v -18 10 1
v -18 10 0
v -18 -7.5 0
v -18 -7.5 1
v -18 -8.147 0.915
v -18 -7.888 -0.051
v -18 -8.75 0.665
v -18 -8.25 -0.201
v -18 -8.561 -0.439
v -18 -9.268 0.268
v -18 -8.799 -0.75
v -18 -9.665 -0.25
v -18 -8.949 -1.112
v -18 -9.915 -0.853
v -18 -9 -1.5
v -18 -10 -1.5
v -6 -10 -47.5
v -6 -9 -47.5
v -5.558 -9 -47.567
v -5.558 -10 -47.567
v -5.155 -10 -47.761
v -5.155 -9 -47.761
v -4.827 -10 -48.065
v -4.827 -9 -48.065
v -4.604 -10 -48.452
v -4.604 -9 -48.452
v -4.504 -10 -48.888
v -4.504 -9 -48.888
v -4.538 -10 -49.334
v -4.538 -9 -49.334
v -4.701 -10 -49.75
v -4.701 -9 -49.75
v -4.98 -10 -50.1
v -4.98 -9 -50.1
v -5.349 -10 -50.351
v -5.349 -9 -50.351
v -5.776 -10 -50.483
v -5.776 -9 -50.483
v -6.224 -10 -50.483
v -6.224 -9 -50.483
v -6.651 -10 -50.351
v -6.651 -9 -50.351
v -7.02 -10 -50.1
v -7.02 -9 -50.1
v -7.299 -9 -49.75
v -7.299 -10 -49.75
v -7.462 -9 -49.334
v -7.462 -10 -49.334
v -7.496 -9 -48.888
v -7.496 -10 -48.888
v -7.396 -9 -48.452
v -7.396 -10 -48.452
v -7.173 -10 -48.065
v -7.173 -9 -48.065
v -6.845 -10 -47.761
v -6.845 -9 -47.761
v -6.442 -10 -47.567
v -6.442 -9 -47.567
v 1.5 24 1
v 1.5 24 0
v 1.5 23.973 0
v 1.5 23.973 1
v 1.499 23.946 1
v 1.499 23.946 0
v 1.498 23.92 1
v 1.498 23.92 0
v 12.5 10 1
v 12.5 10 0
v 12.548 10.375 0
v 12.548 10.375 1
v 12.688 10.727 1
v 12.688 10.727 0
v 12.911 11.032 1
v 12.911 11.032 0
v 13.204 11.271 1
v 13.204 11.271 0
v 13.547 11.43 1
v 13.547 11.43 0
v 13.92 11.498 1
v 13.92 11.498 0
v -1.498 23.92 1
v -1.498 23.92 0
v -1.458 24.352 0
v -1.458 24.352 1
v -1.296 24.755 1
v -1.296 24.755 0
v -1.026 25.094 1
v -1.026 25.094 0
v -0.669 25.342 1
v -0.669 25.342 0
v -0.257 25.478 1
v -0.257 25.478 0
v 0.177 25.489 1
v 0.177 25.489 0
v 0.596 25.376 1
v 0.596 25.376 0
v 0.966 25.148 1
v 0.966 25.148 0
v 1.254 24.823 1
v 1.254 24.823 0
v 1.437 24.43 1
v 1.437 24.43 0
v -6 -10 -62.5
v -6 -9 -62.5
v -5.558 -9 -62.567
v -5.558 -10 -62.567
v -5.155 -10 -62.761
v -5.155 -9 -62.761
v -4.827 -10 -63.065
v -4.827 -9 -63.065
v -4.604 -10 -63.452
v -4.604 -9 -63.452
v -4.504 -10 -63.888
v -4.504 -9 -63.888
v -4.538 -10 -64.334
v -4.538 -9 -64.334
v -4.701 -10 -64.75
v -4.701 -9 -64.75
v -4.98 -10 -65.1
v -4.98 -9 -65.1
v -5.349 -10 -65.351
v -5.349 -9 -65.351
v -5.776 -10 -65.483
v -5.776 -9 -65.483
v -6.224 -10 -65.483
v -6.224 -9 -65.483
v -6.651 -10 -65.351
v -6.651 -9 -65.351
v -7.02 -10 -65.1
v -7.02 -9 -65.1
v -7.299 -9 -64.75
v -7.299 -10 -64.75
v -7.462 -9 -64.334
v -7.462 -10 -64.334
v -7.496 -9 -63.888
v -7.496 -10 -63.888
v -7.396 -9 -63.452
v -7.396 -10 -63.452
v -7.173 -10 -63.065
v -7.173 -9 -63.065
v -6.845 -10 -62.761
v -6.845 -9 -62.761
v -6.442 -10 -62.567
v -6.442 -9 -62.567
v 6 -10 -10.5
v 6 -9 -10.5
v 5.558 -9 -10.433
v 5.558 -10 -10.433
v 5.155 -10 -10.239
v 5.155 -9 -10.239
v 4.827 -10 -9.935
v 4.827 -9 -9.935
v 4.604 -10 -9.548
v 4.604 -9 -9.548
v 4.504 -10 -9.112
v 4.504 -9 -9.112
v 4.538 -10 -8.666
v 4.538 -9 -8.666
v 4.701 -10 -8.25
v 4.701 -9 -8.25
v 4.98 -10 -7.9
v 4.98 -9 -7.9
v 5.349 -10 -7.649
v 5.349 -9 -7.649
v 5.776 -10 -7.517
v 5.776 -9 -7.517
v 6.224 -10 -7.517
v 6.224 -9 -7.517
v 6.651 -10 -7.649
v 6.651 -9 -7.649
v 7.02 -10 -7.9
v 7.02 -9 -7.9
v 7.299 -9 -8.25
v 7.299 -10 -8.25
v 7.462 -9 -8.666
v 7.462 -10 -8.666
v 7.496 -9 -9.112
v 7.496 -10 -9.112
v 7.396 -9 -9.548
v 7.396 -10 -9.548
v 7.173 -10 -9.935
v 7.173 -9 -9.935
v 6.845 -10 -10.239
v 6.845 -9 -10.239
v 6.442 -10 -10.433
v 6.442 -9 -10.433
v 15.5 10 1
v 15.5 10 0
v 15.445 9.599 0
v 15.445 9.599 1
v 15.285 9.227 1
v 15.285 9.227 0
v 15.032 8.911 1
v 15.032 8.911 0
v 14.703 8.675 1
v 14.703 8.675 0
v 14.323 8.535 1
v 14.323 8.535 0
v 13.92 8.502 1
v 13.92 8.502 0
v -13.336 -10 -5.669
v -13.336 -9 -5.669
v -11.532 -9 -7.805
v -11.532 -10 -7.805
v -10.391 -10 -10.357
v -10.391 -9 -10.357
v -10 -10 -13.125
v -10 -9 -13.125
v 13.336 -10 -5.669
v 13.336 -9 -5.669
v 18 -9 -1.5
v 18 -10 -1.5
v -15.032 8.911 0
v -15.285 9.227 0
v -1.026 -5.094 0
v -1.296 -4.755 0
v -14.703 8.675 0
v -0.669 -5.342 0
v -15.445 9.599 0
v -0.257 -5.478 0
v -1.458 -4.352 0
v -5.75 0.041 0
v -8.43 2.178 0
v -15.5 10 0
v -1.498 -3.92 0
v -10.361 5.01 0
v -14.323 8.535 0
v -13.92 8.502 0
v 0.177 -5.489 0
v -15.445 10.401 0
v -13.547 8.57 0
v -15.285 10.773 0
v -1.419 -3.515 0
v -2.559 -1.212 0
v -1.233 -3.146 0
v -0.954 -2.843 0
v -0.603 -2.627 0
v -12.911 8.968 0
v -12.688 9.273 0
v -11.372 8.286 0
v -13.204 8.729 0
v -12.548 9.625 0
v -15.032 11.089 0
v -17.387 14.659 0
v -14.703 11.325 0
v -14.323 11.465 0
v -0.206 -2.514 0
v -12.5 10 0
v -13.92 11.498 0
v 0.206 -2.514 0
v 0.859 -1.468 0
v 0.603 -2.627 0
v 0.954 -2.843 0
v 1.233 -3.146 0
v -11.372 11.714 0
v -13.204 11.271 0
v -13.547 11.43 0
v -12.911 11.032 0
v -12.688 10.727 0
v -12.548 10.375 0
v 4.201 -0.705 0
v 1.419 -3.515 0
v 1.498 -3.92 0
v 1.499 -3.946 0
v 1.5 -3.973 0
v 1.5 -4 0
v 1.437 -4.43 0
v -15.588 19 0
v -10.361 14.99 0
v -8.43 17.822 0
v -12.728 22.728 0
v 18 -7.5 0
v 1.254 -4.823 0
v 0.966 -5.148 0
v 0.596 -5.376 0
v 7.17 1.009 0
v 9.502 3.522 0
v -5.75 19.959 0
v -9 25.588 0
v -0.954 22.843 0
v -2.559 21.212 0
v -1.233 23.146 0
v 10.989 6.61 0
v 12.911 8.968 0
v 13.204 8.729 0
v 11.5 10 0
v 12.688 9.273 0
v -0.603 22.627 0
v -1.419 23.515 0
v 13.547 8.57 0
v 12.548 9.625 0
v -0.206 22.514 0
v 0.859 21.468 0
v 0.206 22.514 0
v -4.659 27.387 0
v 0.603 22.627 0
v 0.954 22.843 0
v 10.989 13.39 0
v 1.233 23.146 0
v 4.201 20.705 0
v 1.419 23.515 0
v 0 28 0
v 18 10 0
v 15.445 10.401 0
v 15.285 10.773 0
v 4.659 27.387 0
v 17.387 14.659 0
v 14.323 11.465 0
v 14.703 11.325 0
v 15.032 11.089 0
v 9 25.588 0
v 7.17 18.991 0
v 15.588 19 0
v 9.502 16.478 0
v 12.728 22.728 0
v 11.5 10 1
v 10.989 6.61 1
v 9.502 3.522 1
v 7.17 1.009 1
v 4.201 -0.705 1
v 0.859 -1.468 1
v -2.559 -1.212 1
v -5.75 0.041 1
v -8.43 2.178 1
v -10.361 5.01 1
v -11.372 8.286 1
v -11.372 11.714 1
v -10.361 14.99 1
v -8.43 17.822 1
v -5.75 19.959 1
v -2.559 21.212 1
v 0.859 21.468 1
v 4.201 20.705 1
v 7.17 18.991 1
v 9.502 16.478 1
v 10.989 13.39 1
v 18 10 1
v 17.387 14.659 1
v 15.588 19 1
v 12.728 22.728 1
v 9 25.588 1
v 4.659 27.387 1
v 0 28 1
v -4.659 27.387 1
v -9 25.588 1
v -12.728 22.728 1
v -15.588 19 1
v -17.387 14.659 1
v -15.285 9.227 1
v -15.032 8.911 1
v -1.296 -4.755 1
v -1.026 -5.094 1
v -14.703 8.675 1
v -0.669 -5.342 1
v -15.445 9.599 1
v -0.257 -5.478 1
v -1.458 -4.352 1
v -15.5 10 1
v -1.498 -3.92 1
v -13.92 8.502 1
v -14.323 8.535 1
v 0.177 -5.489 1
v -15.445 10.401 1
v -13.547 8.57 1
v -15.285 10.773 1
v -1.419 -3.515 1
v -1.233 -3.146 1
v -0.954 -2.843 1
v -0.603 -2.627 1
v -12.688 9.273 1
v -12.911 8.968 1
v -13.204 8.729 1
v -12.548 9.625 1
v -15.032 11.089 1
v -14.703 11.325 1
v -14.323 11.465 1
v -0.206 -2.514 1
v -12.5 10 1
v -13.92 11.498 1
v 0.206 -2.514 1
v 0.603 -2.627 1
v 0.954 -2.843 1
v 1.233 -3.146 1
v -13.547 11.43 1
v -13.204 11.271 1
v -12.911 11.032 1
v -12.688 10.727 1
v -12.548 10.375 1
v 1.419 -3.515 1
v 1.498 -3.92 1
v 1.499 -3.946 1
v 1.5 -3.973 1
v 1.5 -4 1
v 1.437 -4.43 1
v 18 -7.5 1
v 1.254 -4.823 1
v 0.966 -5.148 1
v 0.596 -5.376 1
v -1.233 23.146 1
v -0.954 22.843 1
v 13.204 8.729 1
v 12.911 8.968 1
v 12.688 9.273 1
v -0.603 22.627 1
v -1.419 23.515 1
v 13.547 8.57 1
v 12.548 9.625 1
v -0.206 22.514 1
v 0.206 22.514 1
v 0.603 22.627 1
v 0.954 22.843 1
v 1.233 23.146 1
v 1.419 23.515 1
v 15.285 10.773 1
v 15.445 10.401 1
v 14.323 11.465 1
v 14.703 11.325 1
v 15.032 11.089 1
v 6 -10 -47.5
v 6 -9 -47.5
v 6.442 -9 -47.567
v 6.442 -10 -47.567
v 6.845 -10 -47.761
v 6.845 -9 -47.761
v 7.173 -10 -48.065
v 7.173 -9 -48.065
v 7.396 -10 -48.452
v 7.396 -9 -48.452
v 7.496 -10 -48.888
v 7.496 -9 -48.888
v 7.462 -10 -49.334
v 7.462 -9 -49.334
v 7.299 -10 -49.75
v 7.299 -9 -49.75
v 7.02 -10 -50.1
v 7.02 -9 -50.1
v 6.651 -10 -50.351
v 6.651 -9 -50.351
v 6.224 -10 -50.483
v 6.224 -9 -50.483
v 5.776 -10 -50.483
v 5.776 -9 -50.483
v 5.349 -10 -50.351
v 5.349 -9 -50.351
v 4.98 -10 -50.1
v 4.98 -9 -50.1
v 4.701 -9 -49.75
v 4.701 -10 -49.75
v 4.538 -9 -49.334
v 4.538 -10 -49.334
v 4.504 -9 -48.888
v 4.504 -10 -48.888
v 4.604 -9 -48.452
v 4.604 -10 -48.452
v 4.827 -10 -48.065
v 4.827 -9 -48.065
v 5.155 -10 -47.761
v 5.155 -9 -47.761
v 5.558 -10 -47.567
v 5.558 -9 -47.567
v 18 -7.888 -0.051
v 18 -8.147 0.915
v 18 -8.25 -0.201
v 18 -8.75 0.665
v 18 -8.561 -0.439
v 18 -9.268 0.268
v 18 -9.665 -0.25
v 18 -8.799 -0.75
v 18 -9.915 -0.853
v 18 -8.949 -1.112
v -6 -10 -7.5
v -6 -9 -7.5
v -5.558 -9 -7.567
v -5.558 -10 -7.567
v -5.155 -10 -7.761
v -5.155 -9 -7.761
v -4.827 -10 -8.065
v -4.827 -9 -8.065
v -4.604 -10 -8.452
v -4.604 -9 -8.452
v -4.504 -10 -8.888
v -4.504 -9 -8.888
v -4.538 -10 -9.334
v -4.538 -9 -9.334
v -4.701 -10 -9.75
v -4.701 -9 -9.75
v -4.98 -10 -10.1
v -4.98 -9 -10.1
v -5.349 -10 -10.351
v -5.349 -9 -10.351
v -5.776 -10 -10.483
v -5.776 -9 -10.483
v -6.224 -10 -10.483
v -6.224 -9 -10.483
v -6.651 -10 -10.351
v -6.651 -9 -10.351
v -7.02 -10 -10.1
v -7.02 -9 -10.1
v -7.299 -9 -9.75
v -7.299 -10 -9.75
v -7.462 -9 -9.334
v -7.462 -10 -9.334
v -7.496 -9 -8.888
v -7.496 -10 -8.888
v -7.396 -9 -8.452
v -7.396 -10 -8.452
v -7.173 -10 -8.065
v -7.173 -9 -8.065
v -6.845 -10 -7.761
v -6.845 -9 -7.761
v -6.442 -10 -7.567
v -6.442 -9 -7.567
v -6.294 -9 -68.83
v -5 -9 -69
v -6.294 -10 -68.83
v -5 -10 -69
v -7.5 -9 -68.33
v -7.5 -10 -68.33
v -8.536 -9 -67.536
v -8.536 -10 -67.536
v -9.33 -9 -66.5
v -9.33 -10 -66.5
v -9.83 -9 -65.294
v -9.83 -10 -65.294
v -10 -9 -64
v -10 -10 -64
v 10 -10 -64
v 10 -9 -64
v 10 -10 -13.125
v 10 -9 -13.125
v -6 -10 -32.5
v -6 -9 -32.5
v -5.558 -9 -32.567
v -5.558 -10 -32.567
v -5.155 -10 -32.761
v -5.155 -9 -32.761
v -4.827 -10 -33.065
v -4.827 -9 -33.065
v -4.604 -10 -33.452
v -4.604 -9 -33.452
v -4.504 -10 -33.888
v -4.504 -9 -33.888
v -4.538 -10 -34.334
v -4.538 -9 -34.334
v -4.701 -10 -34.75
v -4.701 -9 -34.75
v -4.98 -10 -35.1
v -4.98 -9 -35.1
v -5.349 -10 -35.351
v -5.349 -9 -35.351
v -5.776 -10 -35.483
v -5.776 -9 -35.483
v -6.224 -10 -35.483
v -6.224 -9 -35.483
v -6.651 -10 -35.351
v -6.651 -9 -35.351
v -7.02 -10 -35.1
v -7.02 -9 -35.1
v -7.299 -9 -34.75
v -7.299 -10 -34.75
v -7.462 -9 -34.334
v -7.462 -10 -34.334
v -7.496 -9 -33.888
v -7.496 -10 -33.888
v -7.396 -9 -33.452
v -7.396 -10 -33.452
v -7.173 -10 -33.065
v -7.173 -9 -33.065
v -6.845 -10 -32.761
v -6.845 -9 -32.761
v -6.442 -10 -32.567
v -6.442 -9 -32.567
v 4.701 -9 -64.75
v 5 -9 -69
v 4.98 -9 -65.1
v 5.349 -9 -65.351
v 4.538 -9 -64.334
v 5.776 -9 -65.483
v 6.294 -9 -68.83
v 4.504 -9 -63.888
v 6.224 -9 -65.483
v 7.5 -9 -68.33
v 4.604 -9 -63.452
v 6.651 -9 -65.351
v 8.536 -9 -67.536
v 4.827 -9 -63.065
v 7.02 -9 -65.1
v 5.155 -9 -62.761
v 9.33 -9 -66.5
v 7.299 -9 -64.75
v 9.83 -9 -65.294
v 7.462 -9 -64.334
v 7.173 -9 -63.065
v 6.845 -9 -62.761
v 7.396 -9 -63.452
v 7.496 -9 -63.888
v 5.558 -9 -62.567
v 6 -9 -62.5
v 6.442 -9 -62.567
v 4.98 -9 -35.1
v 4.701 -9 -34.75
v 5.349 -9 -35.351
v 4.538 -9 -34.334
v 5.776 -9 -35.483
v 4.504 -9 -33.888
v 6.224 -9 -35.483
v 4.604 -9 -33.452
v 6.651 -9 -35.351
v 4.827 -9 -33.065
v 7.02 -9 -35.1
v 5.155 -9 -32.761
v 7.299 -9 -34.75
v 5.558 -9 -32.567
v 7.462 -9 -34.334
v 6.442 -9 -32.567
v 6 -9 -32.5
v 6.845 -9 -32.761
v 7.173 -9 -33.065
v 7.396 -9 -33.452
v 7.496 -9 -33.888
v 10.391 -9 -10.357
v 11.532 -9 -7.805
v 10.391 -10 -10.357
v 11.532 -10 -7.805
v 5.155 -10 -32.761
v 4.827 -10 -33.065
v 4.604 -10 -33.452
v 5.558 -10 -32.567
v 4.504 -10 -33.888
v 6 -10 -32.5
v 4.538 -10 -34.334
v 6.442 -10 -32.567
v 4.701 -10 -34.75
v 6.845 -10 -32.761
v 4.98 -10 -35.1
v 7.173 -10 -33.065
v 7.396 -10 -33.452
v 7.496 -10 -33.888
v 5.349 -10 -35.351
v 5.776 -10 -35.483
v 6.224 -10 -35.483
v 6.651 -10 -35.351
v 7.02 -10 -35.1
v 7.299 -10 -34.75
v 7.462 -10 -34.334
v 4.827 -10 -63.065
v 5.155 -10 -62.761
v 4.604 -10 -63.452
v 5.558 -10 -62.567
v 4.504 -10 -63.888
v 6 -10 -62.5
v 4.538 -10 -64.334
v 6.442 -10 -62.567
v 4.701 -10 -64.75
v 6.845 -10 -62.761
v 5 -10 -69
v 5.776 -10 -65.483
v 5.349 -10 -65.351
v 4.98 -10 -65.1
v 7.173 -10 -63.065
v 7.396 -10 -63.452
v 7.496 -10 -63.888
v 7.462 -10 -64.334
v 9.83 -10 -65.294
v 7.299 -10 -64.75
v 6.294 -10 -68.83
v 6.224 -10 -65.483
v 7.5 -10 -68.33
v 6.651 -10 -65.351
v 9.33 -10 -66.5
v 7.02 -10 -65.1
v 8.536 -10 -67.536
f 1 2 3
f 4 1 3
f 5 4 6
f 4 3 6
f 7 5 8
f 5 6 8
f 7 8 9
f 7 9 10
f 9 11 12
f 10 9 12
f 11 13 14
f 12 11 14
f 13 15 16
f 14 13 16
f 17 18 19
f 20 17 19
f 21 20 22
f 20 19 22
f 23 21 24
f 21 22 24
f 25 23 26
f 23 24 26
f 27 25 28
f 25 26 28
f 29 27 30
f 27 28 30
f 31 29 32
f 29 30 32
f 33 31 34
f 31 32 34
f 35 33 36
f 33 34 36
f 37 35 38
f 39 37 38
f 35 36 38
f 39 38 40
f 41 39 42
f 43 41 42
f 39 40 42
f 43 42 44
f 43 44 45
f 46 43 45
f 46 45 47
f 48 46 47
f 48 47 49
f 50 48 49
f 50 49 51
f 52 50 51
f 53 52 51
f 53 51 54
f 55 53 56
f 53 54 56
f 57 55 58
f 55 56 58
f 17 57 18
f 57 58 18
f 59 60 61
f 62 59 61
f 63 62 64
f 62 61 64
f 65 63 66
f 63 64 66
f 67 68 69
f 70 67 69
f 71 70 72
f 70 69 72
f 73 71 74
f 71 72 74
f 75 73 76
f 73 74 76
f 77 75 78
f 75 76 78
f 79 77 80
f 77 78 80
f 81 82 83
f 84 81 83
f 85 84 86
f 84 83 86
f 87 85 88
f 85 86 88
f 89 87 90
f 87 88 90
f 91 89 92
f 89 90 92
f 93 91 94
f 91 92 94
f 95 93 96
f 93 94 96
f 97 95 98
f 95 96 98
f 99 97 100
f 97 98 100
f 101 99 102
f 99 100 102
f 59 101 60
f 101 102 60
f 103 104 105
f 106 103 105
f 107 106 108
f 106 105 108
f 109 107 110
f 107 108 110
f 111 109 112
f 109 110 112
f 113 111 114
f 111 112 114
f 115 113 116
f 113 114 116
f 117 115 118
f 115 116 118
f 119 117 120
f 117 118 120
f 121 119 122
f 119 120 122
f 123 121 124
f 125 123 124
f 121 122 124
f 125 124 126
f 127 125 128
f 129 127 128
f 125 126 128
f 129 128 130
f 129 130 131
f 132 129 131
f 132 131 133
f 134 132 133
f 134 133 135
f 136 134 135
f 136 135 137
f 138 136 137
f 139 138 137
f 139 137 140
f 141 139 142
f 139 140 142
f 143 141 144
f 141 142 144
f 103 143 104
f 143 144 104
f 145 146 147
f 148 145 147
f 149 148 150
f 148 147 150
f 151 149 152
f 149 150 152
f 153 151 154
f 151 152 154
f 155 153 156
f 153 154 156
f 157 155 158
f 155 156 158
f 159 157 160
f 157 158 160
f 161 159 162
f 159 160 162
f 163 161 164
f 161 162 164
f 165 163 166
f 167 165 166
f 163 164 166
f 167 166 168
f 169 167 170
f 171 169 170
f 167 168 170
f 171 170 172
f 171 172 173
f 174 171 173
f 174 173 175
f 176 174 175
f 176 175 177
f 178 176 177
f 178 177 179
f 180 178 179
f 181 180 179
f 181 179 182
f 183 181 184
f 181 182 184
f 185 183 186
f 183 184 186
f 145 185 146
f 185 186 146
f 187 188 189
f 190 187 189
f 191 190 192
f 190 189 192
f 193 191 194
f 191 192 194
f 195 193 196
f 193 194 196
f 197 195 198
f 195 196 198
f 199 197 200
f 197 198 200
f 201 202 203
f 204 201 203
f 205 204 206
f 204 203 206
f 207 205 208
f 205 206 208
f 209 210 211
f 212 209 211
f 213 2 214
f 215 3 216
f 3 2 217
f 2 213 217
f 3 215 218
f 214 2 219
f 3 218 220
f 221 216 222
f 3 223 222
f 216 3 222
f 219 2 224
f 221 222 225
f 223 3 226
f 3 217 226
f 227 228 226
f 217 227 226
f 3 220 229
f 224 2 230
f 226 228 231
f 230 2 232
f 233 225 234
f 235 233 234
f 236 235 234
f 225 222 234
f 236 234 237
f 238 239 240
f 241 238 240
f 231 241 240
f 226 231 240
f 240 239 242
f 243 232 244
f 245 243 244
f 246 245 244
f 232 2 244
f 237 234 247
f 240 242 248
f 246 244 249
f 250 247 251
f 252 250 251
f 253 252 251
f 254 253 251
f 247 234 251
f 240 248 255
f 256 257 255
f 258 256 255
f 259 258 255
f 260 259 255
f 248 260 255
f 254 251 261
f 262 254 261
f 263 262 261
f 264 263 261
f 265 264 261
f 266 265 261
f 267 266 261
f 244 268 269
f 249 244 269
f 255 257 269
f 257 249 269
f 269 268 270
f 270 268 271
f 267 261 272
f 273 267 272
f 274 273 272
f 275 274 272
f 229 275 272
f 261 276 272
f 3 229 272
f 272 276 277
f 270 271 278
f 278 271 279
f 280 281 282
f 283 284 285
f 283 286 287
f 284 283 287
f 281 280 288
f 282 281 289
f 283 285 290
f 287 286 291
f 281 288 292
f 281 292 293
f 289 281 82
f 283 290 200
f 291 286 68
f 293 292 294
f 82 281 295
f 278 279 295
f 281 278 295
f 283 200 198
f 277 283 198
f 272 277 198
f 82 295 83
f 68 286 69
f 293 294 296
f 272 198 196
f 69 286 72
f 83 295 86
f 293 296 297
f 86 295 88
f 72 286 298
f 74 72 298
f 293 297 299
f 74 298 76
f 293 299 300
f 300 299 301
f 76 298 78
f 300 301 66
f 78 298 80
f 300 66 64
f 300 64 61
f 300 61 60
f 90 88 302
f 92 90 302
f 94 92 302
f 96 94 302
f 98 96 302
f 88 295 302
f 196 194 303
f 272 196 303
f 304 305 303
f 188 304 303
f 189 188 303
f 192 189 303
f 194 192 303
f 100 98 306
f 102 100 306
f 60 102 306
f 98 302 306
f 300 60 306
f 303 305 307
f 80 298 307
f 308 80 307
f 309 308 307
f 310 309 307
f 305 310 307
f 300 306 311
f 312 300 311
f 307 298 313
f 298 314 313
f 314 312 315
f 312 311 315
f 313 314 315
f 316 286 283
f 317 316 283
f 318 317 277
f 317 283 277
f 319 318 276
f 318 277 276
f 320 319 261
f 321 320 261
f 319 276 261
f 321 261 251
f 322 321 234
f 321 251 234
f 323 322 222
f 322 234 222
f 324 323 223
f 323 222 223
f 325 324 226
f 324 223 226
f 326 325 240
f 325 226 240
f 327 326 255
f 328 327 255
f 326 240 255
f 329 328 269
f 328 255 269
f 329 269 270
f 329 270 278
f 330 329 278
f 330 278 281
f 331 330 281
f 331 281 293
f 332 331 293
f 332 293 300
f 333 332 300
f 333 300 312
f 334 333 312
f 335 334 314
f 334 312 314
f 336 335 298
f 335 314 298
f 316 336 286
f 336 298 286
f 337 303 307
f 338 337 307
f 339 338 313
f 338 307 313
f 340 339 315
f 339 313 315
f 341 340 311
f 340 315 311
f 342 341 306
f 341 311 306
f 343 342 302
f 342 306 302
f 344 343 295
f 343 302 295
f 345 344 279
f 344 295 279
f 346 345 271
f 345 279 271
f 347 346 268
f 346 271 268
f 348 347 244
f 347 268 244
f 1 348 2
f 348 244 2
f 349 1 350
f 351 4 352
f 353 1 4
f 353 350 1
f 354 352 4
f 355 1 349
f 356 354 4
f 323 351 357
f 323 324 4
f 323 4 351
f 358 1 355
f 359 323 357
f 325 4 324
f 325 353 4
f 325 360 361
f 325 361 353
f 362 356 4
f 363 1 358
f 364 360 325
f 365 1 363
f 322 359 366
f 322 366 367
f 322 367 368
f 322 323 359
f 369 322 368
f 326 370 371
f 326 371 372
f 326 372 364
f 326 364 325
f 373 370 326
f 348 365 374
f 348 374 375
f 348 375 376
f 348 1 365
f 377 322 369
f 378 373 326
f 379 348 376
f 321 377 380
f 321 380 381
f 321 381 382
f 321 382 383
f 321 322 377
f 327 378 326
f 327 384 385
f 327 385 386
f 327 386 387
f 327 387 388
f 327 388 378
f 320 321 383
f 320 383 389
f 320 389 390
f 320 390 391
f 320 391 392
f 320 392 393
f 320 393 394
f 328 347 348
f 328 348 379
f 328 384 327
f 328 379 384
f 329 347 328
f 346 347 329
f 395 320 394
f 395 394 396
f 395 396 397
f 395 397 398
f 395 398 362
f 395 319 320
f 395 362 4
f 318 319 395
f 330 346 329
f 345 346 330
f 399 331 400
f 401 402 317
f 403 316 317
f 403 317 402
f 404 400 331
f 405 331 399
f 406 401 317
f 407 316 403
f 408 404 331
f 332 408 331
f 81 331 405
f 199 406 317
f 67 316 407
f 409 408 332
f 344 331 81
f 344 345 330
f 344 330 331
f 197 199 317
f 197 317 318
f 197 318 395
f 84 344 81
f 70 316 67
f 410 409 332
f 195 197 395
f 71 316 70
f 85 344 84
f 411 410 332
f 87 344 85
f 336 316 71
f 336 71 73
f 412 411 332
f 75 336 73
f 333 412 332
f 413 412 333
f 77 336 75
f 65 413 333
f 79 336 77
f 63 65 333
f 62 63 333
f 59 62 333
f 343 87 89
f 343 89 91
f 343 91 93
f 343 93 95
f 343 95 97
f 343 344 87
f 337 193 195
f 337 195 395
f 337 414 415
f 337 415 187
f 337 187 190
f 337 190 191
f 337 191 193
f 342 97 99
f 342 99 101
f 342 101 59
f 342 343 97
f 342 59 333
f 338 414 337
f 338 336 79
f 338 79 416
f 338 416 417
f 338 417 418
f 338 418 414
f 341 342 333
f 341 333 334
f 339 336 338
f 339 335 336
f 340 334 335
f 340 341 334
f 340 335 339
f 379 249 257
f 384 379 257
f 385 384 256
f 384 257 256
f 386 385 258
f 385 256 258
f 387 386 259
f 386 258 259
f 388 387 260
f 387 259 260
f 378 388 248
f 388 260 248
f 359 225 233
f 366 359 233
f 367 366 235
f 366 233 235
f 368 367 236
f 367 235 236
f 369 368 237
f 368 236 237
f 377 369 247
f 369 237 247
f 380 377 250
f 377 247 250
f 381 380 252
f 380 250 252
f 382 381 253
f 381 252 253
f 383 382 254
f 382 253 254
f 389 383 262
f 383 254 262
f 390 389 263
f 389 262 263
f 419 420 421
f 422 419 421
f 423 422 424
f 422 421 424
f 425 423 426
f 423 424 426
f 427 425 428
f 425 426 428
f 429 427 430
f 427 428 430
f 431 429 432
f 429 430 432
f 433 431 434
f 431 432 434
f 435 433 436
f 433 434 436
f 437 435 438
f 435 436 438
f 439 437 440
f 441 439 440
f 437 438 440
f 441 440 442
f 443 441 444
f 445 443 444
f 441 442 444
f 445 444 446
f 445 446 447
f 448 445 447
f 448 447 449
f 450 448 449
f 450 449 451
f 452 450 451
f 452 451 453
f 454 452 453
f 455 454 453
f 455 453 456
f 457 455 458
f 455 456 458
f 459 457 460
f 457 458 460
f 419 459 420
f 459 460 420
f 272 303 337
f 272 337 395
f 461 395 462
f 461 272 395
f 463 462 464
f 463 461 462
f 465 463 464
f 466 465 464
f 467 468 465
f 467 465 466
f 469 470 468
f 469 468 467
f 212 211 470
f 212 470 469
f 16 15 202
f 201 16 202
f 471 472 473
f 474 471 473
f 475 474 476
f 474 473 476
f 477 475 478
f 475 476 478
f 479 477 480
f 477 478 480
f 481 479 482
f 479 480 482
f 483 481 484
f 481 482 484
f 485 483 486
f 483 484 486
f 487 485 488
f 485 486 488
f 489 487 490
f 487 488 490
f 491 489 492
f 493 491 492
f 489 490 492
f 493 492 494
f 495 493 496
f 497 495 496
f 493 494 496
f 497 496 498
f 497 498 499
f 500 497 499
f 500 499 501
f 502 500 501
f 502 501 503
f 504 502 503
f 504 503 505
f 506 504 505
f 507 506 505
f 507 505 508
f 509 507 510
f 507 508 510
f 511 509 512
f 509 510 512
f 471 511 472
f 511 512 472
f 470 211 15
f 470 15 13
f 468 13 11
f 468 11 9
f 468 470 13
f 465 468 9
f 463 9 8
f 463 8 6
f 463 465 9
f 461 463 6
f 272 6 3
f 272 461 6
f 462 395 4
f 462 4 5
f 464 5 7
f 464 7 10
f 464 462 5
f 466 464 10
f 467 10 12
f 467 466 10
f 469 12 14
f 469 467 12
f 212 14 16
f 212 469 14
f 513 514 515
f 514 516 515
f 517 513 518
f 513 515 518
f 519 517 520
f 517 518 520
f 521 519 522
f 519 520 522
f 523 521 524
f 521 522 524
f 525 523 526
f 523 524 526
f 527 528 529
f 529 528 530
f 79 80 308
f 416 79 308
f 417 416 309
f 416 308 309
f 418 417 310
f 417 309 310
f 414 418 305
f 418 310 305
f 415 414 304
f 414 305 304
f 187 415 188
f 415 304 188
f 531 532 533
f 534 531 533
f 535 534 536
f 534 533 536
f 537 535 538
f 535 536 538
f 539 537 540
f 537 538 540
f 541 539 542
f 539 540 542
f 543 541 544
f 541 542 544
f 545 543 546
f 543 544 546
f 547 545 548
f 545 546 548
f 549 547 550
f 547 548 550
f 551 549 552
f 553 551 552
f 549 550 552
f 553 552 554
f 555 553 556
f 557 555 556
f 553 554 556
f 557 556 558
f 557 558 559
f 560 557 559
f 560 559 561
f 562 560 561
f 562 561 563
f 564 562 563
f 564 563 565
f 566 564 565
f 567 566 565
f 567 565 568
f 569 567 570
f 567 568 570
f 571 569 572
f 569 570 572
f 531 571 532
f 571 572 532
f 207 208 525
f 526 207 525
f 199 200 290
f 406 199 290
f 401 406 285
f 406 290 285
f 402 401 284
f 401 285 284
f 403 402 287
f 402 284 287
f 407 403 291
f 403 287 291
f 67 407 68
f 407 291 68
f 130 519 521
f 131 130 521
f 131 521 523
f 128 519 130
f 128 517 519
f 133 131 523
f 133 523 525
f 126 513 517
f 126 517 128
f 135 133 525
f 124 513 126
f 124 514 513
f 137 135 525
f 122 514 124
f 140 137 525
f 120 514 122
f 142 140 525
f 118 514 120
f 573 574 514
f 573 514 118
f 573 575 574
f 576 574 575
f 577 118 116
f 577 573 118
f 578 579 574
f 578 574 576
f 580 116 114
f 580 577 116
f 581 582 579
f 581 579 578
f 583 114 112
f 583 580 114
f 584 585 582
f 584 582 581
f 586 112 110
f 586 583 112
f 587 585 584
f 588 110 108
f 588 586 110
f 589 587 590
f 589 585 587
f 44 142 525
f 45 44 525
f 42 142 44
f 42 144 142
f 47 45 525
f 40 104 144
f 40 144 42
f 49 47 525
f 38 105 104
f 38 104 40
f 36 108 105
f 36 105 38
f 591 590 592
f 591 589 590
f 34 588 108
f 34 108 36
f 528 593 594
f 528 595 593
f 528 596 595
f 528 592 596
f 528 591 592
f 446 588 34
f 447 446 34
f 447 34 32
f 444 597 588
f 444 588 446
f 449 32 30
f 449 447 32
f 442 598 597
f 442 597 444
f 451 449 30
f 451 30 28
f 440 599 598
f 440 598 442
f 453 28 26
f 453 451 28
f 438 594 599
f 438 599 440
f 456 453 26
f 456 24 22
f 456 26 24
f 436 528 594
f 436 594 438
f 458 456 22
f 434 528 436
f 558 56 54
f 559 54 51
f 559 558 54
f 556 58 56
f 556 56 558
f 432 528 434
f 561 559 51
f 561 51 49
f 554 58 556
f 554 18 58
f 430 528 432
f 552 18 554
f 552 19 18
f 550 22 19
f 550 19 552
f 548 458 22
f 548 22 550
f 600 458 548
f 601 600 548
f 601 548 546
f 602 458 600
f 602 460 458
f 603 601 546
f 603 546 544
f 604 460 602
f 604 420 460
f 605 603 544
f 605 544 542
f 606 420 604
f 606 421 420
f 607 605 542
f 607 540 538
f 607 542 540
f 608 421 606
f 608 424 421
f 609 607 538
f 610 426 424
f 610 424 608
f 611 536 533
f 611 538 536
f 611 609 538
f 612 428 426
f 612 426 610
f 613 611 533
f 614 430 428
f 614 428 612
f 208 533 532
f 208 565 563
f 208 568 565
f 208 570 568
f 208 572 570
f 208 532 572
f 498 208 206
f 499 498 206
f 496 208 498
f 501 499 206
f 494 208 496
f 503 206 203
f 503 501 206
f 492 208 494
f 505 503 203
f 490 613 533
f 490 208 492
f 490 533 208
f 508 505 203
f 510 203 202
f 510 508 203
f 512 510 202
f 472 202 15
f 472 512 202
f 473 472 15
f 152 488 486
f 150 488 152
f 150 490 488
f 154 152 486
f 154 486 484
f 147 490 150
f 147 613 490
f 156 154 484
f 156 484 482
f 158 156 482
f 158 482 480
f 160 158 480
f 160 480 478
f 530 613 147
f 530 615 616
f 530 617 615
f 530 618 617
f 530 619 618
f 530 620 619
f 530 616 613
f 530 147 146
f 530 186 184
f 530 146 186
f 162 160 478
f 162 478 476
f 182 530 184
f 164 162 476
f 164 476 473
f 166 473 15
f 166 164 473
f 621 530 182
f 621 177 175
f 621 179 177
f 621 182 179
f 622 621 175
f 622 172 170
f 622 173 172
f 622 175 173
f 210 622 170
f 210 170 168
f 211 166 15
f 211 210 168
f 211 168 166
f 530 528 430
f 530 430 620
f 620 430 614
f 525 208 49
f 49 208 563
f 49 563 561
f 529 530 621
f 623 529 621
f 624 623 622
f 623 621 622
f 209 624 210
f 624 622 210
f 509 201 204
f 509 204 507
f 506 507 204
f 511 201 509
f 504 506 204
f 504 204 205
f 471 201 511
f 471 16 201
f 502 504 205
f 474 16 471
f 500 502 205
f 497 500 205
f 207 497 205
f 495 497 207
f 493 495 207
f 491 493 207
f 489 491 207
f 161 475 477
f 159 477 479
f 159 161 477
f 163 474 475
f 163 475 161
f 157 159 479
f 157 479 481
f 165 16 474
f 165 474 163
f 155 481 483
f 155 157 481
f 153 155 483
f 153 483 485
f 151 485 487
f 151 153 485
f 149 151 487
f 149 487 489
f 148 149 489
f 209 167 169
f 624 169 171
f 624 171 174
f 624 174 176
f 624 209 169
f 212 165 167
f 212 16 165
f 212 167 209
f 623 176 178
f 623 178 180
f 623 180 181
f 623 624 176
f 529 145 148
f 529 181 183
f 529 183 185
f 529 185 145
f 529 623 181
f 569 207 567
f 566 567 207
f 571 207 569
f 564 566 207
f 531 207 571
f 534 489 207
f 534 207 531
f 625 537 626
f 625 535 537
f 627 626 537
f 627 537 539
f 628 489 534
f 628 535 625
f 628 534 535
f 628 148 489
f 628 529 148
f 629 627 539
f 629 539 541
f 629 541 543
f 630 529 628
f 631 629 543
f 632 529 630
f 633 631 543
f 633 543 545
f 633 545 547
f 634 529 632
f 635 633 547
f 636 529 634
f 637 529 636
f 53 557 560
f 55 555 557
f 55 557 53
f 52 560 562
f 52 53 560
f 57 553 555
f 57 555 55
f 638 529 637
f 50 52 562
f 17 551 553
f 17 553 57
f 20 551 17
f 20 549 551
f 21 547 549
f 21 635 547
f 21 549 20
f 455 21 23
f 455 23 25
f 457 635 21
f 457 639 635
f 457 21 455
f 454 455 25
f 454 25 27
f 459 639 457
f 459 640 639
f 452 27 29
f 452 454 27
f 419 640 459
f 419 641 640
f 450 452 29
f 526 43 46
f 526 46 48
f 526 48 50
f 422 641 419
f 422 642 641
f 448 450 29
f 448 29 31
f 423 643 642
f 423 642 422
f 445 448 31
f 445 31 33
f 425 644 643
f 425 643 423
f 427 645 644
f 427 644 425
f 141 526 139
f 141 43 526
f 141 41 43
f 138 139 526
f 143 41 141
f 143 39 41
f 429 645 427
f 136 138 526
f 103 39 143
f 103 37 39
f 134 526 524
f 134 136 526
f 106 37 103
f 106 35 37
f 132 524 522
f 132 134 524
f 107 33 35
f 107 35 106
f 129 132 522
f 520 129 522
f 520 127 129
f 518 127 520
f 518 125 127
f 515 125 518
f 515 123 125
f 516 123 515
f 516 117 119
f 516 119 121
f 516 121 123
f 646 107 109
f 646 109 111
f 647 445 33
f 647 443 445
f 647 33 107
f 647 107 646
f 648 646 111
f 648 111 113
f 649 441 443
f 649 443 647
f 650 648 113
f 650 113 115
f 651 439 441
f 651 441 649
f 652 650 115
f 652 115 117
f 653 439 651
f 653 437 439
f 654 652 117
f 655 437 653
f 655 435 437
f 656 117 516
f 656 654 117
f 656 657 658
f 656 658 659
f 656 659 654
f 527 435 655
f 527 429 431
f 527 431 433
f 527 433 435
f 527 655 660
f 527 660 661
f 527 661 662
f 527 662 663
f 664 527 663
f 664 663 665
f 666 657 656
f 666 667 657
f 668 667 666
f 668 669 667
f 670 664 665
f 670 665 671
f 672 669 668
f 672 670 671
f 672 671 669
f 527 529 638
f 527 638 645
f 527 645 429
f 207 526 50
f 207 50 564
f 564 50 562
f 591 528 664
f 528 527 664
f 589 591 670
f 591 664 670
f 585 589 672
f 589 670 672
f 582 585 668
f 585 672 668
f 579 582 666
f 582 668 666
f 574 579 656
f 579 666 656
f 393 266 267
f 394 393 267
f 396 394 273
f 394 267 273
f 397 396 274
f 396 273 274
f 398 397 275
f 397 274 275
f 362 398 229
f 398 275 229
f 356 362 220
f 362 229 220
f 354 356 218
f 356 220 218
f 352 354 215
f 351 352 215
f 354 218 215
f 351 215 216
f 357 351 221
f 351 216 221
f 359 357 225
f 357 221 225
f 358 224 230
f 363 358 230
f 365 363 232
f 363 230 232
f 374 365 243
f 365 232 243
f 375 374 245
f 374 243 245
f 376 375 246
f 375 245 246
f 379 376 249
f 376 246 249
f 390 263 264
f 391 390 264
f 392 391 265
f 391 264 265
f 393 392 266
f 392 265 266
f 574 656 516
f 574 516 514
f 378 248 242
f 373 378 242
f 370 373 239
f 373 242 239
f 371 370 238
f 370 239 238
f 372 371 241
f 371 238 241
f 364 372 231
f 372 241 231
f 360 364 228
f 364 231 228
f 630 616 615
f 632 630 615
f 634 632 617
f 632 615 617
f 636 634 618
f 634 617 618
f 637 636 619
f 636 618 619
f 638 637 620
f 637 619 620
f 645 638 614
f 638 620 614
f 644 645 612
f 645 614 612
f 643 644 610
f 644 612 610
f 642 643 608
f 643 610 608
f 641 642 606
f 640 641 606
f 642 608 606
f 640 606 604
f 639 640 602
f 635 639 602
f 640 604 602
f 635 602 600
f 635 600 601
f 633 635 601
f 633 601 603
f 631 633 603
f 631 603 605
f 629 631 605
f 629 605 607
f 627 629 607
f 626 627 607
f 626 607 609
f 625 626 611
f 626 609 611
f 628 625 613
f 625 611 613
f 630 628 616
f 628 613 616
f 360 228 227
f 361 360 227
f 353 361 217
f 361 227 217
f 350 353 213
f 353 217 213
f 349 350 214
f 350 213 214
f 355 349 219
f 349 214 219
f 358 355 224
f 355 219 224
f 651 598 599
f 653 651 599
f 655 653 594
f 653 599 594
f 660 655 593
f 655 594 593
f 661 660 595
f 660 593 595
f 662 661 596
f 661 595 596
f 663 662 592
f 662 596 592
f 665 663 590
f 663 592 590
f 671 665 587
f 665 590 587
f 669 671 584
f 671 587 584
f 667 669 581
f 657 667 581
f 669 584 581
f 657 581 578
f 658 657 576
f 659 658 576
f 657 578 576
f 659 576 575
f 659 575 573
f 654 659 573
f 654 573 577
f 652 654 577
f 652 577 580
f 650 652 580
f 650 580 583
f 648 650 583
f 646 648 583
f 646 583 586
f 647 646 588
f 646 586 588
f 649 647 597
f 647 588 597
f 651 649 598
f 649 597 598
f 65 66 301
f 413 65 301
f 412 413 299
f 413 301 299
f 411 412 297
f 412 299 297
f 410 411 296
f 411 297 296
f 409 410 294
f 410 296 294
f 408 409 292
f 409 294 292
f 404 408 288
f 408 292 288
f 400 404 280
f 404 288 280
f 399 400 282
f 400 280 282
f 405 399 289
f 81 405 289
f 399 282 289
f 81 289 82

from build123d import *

# Parameters (mm, degrees)
BOSS_EXTRUDE1_DEPTH          = 1
EDGE_FLANGE1_STRIP_W         = 7
EDGE_FLANGE1_STRIP_H         = 1
EDGE_FLANGE1_STRIP_CUT_DEPTH = 36
EDGE_FLANGE1_DEPTH           = 36
SKETCH12_R                   = 1.5
CUT_EXTRUDE2_DEPTH           = 1
FILLET1_R                    = 5


# Sheet-metal steps are written as plain solids
with BuildPart() as part:
    # Sketch1 → Boss-Extrude1 (new body)
    with BuildSketch(Plane.XY):
        with BuildLine():
            Line((11.5, 10), (12.5, 10))
            ThreePointArc((12.5, 10), (12.911299923, 11.031858587), (13.919642857, 11.49784603))
            ThreePointArc((13.919642857, 11.49784603), (9.899494937, 19.899494937), (1.49784603, 23.919642857))
            ThreePointArc((1.49784603, 23.919642857), (0, 22.5), (-1.49784603, 23.919642857))
            ThreePointArc((-1.49784603, 23.919642857), (-9.899494937, 19.899494937), (-13.919642857, 11.49784603))
            ThreePointArc((-13.919642857, 11.49784603), (-12.911299923, 11.031858587), (-12.5, 10))
            Line((-12.5, 10), (-11.5, 10))
            ThreePointArc((-11.5, 10), (0, 21.5), (11.5, 10))
        make_face()
        with BuildLine():
            ThreePointArc((13.919642857, 11.49784603), (15.031858587, 11.088700077), (15.5, 10))
            Line((15.5, 10), (18, 10))
            ThreePointArc((18, 10), (0, 28), (-18, 10))
            Line((-18, 10), (-15.5, 10))
            ThreePointArc((-15.5, 10), (-15.031858587, 11.088700077), (-13.919642857, 11.49784603))
            ThreePointArc((-13.919642857, 11.49784603), (-9.899494937, 19.899494937), (-1.49784603, 23.919642857))
            ThreePointArc((-1.49784603, 23.919642857), (-0.040193003, 25.499461411), (1.5, 24))
            ThreePointArc((1.5, 24), (1.499461411, 23.959806997), (1.49784603, 23.919642857))
            ThreePointArc((1.49784603, 23.919642857), (9.899494937, 19.899494937), (13.919642857, 11.49784603))
        make_face()
        with BuildLine():
            ThreePointArc((13.919642857, 8.50215397), (12.911299923, 8.968141413), (12.5, 10))
            Line((12.5, 10), (11.5, 10))
            ThreePointArc((11.5, 10), (0, -1.5), (-11.5, 10))
            Line((-11.5, 10), (-12.5, 10))
            ThreePointArc((-12.5, 10), (-12.911299923, 8.968141413), (-13.919642857, 8.50215397))
            ThreePointArc((-13.919642857, 8.50215397), (-9.899494937, 0.100505063), (-1.49784603, -3.919642857))
            ThreePointArc((-1.49784603, -3.919642857), (0, -2.5), (1.49784603, -3.919642857))
            ThreePointArc((1.49784603, -3.919642857), (9.899494937, 0.100505063), (13.919642857, 8.50215397))
        make_face()
        with BuildLine():
            Line((18, 10), (15.5, 10))
            ThreePointArc((15.5, 10), (15.031858587, 8.911299923), (13.919642857, 8.50215397))
            ThreePointArc((13.919642857, 8.50215397), (9.899494937, 0.100505063), (1.49784603, -3.919642857))
            ThreePointArc((1.49784603, -3.919642857), (1.499461411, -3.959806997), (1.5, -4))
            ThreePointArc((1.5, -4), (-0.040193003, -5.499461411), (-1.49784603, -3.919642857))
            ThreePointArc((-1.49784603, -3.919642857), (-9.899494937, 0.100505063), (-13.919642857, 8.50215397))
            ThreePointArc((-13.919642857, 8.50215397), (-15.031858587, 8.911299923), (-15.5, 10))
            Line((-15.5, 10), (-18, 10))
            ThreePointArc((-18, 10), (0, -8), (18, 10))
        make_face()
        with BuildLine():
            Line((18, -10), (18, 10))
            ThreePointArc((18, 10), (0, -8), (-18, 10))
            Line((-18, 10), (-18, -10))
            Line((-18, -10), (18, -10))
        make_face()
    extrude(amount=BOSS_EXTRUDE1_DEPTH)

    # Edge-Flange1 strip (across the edge) → Edge-Flange1 strip cut (cut)
    with BuildSketch(Plane(origin=(18, -10, 0), x_dir=(0, 1, 0), z_dir=(-1, 0, 0))):
        with Locations((-1, -0.5)):
            Rectangle(EDGE_FLANGE1_STRIP_W, EDGE_FLANGE1_STRIP_H)
    extrude(amount=EDGE_FLANGE1_STRIP_CUT_DEPTH, mode=Mode.SUBTRACT)

    # Edge-Flange1 section (across the edge) → Edge-Flange1 (add)
    with BuildSketch(Plane(origin=(18, -10, 0), x_dir=(0, 1, 0), z_dir=(-1, 0, 0))):
        with BuildLine():
            Line((0, 1.5), (0, 69))
            Line((0, 69), (1, 69))
            Line((1, 69), (1, 1.5))
            ThreePointArc((1, 1.5), (1.439339828, 0.439339828), (2.5, 0))
            Line((2.5, 0), (2.5, -1))
            ThreePointArc((2.5, -1), (0.732233047, -0.267766953), (0, 1.5))
        make_face()
    extrude(amount=EDGE_FLANGE1_DEPTH)

    # Sketch12 → Cut-Extrude2 (cut)
    with BuildSketch(Plane(origin=(0, -9, 0), x_dir=(1, 0, 0), z_dir=(0, 1, 0))):
        with BuildLine():
            Line((-18, 69), (-18, 1.5))
            Line((-18, 1.5), (-13.335935783, 5.66873596))
            ThreePointArc((-13.335935783, 5.66873596), (-10.872003446, 9.040546507), (-10, 13.124622769))
            Line((-10, 13.124622769), (-10, 69))
            Line((-10, 69), (-18, 69))
        make_face()
        with BuildLine():
            Line((13.335935783, 5.66873596), (18, 1.5))
            Line((18, 1.5), (18, 69))
            Line((18, 69), (10, 69))
            Line((10, 69), (10, 13.124622769))
            ThreePointArc((10, 13.124622769), (10.872003446, 9.040546507), (13.335935783, 5.66873596))
        make_face()
        with Locations(Location((-6, 64, 0), (0, 0, 270))):
            Circle(SKETCH12_R)
        with Locations(Location((6, 64, 0), (0, 0, 270))):
            Circle(SKETCH12_R)
        with Locations(Location((-6, 49, 0), (0, 0, 270))):
            Circle(SKETCH12_R)
        with Locations(Location((6, 49, 0), (0, 0, 270))):
            Circle(SKETCH12_R)
        with Locations(Location((-6, 34, 0), (0, 0, 270))):
            Circle(SKETCH12_R)
        with Locations(Location((6, 34, 0), (0, 0, 270))):
            Circle(SKETCH12_R)
        with Locations(Location((-6, 9, 0), (0, 0, 270))):
            Circle(SKETCH12_R)
        with Locations(Location((6, 9, 0), (0, 0, 90))):
            Circle(SKETCH12_R)
    extrude(amount=-CUT_EXTRUDE2_DEPTH, mode=Mode.SUBTRACT)

    # Fillet1
    fillet1_edges = [part.edges().sort_by_distance(p)[0] for p in [
        (10, -9.5, -69),
        (-10, -9.5, -69),
    ]]
    fillet(fillet1_edges, radius=FILLET1_R)


solid = part.part
